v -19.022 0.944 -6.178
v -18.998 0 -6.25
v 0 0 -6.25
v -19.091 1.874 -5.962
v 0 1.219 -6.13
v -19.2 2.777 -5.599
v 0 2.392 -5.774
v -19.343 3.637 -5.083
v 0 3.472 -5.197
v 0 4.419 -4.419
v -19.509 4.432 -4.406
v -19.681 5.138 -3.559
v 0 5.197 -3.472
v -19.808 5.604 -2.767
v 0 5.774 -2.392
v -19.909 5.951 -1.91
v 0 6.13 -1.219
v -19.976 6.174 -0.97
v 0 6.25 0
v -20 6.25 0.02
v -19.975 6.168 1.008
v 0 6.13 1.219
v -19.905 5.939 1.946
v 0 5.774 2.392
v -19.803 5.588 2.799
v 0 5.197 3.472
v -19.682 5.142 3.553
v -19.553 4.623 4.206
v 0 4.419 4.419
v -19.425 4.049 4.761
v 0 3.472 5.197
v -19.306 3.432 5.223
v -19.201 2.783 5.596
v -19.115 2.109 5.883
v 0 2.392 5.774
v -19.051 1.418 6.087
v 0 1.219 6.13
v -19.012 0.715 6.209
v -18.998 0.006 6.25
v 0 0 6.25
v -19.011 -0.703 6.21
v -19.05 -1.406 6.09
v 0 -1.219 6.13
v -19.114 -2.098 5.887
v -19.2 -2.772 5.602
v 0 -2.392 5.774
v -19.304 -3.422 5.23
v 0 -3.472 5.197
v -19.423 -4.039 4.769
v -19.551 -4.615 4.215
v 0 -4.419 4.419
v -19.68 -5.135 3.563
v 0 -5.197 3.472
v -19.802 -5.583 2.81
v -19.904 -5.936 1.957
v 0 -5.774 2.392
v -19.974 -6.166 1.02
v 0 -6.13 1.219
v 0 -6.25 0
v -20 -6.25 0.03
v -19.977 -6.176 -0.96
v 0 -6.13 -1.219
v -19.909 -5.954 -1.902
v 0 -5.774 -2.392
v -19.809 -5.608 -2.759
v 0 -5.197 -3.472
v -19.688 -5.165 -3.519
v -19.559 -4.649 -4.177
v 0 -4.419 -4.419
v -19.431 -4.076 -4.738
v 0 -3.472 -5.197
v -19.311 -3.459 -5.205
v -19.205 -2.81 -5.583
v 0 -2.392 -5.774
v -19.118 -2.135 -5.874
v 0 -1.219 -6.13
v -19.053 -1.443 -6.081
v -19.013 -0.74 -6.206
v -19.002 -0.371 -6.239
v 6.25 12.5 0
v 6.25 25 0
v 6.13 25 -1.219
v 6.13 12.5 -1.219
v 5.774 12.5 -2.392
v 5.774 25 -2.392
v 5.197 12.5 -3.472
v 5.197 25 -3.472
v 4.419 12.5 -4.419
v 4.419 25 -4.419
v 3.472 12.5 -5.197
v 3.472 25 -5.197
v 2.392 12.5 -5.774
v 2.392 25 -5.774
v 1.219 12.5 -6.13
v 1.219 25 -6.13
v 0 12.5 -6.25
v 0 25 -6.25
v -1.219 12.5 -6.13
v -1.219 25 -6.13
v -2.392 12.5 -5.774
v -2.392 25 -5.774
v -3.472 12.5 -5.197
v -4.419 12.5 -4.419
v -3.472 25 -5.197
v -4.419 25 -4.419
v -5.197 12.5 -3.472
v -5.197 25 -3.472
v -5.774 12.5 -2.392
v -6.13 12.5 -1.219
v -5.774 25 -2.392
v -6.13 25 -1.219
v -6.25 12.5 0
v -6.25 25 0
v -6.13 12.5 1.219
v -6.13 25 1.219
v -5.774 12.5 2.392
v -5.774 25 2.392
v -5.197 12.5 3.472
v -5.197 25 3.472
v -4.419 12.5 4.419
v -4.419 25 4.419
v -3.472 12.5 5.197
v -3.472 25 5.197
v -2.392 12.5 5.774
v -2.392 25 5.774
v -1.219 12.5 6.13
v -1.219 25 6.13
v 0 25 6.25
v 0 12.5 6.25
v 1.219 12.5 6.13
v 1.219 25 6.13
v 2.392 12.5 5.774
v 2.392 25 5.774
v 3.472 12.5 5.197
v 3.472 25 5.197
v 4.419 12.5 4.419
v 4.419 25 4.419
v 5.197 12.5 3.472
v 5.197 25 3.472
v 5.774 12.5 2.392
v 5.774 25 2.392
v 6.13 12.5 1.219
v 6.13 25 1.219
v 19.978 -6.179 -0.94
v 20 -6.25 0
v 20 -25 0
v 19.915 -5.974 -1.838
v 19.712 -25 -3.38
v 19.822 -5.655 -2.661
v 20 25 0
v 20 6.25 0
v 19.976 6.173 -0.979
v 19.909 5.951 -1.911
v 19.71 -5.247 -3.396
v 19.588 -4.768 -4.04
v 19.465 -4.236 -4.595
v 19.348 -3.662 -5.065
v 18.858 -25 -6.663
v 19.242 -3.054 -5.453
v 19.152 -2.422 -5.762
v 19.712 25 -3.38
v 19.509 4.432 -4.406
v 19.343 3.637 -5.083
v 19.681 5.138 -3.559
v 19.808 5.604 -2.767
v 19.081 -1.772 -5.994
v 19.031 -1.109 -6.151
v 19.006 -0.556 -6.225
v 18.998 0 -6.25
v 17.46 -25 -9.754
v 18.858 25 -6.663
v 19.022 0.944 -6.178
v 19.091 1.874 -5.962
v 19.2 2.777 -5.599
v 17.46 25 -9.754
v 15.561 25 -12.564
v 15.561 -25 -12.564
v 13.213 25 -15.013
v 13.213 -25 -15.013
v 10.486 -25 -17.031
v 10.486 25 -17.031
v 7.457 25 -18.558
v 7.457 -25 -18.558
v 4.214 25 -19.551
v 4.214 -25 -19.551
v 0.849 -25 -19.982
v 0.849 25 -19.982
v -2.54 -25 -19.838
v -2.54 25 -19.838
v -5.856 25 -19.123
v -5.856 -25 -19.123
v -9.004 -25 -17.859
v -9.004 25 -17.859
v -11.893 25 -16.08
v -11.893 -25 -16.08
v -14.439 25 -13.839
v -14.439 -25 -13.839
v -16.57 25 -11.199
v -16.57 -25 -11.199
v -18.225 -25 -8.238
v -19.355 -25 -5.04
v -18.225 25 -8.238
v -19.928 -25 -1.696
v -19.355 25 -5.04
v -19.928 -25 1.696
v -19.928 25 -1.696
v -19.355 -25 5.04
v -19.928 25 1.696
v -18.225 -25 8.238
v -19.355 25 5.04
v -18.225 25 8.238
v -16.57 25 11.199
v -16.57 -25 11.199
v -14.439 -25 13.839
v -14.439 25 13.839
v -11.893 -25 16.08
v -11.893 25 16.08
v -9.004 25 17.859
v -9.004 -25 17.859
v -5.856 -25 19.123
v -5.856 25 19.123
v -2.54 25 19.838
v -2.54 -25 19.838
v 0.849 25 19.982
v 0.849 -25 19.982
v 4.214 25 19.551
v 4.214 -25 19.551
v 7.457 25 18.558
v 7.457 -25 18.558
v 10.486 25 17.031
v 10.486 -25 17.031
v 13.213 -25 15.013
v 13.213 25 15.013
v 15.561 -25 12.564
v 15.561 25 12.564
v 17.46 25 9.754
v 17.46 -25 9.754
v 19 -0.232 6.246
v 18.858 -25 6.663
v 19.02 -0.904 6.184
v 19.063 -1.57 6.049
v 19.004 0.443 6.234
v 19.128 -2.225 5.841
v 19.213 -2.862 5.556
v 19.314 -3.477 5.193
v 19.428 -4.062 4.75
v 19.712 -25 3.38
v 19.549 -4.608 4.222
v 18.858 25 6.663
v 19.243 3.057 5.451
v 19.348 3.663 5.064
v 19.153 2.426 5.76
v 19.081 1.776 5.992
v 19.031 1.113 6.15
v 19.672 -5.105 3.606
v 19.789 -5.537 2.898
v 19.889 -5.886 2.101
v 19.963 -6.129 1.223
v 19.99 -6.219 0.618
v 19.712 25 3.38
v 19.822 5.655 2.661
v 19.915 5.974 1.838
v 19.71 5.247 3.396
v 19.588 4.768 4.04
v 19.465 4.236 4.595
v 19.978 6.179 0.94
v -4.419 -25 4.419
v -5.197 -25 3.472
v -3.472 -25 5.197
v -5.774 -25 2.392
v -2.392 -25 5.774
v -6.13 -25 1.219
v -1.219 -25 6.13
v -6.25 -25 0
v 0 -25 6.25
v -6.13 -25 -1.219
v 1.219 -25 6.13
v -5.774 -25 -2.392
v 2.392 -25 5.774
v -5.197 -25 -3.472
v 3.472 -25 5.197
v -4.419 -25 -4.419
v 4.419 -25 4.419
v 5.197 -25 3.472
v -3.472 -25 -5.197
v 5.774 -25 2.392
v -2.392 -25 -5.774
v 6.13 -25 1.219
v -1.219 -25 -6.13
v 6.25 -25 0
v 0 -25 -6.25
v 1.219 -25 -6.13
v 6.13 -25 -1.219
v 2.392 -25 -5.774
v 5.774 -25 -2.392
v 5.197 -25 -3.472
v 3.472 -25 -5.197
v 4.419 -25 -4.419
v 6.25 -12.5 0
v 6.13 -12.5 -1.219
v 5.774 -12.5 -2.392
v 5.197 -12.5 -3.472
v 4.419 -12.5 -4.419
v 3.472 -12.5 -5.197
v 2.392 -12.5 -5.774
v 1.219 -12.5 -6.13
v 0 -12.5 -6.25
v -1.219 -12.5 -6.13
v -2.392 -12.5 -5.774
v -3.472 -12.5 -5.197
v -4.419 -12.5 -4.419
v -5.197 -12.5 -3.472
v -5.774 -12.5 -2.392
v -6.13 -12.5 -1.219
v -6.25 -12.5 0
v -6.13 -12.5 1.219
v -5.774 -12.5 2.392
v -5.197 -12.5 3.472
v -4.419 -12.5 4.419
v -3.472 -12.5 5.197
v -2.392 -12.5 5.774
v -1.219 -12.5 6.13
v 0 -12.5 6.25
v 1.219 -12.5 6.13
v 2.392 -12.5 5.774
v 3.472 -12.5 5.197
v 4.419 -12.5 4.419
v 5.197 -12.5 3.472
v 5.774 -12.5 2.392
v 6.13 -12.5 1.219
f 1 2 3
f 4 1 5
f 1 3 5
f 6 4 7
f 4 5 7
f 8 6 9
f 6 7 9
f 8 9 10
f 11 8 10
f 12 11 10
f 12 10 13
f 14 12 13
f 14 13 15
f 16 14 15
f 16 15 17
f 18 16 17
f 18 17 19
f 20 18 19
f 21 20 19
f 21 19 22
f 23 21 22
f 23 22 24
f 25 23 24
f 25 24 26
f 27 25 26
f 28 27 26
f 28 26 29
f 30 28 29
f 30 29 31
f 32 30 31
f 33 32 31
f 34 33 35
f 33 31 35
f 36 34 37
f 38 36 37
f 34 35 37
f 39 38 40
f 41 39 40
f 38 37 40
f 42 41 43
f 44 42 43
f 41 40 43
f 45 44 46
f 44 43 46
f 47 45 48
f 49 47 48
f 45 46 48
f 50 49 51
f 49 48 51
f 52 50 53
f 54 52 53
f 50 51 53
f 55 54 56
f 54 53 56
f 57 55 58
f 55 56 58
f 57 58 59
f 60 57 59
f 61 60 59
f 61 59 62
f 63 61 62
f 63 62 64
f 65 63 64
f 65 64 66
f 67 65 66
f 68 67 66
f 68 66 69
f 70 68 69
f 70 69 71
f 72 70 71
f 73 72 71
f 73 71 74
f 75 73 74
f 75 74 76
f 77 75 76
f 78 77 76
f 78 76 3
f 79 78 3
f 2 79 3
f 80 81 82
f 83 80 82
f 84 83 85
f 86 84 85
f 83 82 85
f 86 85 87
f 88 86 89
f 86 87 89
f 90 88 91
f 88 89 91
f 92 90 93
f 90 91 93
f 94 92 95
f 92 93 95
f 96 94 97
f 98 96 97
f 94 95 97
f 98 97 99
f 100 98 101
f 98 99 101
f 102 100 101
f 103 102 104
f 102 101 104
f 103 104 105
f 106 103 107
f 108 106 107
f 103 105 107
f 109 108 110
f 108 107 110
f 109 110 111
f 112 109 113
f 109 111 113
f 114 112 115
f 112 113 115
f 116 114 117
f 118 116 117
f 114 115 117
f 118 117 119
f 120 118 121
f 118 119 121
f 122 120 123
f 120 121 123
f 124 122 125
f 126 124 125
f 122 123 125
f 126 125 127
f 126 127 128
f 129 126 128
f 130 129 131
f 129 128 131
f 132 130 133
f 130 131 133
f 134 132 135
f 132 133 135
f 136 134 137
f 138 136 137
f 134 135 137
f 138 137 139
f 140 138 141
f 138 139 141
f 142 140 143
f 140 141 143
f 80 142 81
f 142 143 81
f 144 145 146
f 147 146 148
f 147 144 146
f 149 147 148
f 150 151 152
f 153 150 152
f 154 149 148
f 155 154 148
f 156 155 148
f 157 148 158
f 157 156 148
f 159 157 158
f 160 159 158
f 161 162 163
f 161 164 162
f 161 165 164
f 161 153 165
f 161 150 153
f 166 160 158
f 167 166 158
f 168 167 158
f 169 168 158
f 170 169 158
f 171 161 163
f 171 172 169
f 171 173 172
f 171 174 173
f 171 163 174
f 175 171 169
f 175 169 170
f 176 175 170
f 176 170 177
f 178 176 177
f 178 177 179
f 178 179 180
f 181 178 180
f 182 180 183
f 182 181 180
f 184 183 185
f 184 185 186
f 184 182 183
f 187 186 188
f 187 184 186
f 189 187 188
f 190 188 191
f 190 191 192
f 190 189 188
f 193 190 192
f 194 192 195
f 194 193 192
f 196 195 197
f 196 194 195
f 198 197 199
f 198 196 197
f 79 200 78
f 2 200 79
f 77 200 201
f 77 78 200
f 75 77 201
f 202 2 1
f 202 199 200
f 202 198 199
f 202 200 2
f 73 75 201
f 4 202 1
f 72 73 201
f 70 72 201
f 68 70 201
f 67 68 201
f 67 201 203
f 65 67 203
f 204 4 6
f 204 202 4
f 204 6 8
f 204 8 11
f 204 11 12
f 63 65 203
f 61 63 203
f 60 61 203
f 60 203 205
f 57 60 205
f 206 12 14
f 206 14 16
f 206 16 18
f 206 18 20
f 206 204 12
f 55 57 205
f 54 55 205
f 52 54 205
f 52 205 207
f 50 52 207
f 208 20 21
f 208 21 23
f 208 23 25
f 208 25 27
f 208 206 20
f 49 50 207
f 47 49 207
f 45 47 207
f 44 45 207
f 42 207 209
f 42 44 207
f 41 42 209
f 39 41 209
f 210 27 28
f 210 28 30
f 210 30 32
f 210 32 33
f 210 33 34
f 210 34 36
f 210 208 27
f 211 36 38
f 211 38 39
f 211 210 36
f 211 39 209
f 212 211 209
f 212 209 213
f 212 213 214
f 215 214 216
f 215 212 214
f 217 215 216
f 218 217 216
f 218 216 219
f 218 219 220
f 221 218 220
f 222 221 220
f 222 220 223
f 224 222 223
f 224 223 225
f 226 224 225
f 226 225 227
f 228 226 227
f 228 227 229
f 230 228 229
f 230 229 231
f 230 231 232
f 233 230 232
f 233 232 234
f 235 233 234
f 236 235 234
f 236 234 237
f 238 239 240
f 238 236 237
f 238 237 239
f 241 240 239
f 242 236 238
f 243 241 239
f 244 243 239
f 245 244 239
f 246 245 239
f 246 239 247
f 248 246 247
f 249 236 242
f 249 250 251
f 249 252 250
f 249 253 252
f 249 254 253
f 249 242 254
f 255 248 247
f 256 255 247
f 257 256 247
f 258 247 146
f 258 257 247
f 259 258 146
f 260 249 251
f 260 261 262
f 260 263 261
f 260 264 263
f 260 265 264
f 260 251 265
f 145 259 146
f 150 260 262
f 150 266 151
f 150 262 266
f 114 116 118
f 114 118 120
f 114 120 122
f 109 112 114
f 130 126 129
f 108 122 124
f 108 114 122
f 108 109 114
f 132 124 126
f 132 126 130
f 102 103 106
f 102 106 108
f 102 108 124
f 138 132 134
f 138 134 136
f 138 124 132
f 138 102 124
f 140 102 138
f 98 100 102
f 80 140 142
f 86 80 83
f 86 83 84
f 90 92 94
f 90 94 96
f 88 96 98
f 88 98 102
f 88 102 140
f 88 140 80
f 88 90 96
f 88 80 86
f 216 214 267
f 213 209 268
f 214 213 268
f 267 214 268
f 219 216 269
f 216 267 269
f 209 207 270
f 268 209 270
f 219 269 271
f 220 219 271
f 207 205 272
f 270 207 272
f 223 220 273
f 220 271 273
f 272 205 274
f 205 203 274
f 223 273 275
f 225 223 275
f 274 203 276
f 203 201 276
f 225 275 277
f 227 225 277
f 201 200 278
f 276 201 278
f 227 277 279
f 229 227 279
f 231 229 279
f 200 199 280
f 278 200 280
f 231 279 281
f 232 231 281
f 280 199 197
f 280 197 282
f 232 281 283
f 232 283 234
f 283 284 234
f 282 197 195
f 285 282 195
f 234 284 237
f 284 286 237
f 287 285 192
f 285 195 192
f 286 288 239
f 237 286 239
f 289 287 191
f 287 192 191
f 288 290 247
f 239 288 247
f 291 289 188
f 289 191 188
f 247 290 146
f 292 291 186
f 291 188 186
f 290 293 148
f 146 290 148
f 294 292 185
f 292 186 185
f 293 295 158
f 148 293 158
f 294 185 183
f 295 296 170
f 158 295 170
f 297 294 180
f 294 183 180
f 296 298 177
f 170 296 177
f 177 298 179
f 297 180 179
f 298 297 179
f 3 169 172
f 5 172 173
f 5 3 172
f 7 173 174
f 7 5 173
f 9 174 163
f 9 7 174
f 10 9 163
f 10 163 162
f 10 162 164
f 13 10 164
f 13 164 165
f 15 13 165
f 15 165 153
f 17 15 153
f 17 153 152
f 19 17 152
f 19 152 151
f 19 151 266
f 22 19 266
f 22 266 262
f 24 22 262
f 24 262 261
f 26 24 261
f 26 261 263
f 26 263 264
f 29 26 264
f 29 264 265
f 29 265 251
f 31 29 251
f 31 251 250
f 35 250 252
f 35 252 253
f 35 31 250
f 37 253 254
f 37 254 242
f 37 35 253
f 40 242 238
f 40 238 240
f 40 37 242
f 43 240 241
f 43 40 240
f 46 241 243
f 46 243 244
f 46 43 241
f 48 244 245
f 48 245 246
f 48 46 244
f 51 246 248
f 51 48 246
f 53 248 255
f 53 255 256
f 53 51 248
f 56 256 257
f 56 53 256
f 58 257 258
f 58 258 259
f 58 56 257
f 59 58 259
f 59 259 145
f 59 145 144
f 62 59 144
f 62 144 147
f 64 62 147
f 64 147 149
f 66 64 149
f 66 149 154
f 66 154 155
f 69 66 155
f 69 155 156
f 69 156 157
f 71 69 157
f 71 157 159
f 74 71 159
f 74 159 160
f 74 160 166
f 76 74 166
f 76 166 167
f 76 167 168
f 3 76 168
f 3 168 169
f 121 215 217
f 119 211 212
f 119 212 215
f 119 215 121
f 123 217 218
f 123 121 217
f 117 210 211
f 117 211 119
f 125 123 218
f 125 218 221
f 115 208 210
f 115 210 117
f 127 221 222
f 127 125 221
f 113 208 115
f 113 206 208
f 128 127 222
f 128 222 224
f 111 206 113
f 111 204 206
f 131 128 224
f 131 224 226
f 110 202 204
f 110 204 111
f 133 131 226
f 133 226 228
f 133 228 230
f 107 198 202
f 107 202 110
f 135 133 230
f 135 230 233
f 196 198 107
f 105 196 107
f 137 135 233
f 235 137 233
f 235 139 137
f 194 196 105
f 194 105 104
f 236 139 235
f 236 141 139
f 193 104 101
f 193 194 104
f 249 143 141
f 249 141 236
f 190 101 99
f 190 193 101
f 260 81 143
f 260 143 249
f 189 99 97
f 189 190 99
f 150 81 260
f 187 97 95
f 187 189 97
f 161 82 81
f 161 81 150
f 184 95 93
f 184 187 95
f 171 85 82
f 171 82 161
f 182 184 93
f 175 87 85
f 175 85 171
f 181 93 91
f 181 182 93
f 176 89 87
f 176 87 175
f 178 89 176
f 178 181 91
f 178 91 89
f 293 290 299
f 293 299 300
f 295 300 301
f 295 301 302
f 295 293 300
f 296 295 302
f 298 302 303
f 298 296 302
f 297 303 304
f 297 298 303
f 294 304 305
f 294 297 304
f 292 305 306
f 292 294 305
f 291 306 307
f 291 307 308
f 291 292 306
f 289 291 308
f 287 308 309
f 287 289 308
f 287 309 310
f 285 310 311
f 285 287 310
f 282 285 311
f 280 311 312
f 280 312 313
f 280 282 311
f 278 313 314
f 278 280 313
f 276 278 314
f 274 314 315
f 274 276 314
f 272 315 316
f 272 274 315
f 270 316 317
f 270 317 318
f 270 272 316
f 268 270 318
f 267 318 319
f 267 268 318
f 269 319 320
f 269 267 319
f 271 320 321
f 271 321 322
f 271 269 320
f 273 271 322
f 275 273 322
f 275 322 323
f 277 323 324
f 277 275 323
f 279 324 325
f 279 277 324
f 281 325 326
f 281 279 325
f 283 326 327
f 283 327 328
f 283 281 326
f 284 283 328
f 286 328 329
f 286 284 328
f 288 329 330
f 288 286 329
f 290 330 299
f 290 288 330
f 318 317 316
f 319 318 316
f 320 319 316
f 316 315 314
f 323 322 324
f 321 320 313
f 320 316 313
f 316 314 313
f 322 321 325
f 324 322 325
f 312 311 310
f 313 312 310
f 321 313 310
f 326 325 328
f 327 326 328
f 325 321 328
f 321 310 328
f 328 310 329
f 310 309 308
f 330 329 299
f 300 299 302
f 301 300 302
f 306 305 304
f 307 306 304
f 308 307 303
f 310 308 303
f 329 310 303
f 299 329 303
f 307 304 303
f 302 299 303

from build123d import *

# Parameters (mm, degrees)
BOSS_EXTRUDE1_DEPTH      = 25
BOSS_EXTRUDE1_DEPTH_BACK = 25
SKETCH2_R                = 20
CUT_EXTRUDE1_DEPTH       = 40
CUT_EXTRUDE1_DEPTH_BACK  = 40
SKETCH3_R                = 6.25
SKETCH4_R                = 6.25
CUT_EXTRUDE2_DEPTH       = 12.5


with BuildPart() as part:
    # Sketch2 → Boss-Extrude1 (new, two sides: drawn at the far end of the back side and taken through both)
    with BuildSketch(Plane(origin=(0, 0, 0), x_dir=(1, 0, 0), z_dir=(0, 1, 0)).offset(-BOSS_EXTRUDE1_DEPTH_BACK)):
        Circle(SKETCH2_R)
    extrude(amount=BOSS_EXTRUDE1_DEPTH + BOSS_EXTRUDE1_DEPTH_BACK)

    # Sketch3 → Cut-Extrude1 (cut, two sides: drawn at the far end of the back side and taken through both)
    with BuildSketch(Plane(origin=(0, 0, 0), x_dir=(0, 0, -1), z_dir=(1, 0, 0)).offset(-CUT_EXTRUDE1_DEPTH_BACK)):
        Circle(SKETCH3_R)
    extrude(amount=CUT_EXTRUDE1_DEPTH + CUT_EXTRUDE1_DEPTH_BACK, mode=Mode.SUBTRACT)

    # Sketch4 → Cut-Extrude2 (cut)
    with BuildSketch(Plane(origin=(0, 25, 0), x_dir=(1, 0, 0), z_dir=(0, 1, 0))):
        Circle(SKETCH4_R)
    cut_extrude2 = extrude(amount=-CUT_EXTRUDE2_DEPTH, mode=Mode.SUBTRACT)

    # Mirror1: Cut-Extrude2 across plane
    add(cut_extrude2.mirror(Plane.ZX), mode=Mode.SUBTRACT)


solid = part.part
